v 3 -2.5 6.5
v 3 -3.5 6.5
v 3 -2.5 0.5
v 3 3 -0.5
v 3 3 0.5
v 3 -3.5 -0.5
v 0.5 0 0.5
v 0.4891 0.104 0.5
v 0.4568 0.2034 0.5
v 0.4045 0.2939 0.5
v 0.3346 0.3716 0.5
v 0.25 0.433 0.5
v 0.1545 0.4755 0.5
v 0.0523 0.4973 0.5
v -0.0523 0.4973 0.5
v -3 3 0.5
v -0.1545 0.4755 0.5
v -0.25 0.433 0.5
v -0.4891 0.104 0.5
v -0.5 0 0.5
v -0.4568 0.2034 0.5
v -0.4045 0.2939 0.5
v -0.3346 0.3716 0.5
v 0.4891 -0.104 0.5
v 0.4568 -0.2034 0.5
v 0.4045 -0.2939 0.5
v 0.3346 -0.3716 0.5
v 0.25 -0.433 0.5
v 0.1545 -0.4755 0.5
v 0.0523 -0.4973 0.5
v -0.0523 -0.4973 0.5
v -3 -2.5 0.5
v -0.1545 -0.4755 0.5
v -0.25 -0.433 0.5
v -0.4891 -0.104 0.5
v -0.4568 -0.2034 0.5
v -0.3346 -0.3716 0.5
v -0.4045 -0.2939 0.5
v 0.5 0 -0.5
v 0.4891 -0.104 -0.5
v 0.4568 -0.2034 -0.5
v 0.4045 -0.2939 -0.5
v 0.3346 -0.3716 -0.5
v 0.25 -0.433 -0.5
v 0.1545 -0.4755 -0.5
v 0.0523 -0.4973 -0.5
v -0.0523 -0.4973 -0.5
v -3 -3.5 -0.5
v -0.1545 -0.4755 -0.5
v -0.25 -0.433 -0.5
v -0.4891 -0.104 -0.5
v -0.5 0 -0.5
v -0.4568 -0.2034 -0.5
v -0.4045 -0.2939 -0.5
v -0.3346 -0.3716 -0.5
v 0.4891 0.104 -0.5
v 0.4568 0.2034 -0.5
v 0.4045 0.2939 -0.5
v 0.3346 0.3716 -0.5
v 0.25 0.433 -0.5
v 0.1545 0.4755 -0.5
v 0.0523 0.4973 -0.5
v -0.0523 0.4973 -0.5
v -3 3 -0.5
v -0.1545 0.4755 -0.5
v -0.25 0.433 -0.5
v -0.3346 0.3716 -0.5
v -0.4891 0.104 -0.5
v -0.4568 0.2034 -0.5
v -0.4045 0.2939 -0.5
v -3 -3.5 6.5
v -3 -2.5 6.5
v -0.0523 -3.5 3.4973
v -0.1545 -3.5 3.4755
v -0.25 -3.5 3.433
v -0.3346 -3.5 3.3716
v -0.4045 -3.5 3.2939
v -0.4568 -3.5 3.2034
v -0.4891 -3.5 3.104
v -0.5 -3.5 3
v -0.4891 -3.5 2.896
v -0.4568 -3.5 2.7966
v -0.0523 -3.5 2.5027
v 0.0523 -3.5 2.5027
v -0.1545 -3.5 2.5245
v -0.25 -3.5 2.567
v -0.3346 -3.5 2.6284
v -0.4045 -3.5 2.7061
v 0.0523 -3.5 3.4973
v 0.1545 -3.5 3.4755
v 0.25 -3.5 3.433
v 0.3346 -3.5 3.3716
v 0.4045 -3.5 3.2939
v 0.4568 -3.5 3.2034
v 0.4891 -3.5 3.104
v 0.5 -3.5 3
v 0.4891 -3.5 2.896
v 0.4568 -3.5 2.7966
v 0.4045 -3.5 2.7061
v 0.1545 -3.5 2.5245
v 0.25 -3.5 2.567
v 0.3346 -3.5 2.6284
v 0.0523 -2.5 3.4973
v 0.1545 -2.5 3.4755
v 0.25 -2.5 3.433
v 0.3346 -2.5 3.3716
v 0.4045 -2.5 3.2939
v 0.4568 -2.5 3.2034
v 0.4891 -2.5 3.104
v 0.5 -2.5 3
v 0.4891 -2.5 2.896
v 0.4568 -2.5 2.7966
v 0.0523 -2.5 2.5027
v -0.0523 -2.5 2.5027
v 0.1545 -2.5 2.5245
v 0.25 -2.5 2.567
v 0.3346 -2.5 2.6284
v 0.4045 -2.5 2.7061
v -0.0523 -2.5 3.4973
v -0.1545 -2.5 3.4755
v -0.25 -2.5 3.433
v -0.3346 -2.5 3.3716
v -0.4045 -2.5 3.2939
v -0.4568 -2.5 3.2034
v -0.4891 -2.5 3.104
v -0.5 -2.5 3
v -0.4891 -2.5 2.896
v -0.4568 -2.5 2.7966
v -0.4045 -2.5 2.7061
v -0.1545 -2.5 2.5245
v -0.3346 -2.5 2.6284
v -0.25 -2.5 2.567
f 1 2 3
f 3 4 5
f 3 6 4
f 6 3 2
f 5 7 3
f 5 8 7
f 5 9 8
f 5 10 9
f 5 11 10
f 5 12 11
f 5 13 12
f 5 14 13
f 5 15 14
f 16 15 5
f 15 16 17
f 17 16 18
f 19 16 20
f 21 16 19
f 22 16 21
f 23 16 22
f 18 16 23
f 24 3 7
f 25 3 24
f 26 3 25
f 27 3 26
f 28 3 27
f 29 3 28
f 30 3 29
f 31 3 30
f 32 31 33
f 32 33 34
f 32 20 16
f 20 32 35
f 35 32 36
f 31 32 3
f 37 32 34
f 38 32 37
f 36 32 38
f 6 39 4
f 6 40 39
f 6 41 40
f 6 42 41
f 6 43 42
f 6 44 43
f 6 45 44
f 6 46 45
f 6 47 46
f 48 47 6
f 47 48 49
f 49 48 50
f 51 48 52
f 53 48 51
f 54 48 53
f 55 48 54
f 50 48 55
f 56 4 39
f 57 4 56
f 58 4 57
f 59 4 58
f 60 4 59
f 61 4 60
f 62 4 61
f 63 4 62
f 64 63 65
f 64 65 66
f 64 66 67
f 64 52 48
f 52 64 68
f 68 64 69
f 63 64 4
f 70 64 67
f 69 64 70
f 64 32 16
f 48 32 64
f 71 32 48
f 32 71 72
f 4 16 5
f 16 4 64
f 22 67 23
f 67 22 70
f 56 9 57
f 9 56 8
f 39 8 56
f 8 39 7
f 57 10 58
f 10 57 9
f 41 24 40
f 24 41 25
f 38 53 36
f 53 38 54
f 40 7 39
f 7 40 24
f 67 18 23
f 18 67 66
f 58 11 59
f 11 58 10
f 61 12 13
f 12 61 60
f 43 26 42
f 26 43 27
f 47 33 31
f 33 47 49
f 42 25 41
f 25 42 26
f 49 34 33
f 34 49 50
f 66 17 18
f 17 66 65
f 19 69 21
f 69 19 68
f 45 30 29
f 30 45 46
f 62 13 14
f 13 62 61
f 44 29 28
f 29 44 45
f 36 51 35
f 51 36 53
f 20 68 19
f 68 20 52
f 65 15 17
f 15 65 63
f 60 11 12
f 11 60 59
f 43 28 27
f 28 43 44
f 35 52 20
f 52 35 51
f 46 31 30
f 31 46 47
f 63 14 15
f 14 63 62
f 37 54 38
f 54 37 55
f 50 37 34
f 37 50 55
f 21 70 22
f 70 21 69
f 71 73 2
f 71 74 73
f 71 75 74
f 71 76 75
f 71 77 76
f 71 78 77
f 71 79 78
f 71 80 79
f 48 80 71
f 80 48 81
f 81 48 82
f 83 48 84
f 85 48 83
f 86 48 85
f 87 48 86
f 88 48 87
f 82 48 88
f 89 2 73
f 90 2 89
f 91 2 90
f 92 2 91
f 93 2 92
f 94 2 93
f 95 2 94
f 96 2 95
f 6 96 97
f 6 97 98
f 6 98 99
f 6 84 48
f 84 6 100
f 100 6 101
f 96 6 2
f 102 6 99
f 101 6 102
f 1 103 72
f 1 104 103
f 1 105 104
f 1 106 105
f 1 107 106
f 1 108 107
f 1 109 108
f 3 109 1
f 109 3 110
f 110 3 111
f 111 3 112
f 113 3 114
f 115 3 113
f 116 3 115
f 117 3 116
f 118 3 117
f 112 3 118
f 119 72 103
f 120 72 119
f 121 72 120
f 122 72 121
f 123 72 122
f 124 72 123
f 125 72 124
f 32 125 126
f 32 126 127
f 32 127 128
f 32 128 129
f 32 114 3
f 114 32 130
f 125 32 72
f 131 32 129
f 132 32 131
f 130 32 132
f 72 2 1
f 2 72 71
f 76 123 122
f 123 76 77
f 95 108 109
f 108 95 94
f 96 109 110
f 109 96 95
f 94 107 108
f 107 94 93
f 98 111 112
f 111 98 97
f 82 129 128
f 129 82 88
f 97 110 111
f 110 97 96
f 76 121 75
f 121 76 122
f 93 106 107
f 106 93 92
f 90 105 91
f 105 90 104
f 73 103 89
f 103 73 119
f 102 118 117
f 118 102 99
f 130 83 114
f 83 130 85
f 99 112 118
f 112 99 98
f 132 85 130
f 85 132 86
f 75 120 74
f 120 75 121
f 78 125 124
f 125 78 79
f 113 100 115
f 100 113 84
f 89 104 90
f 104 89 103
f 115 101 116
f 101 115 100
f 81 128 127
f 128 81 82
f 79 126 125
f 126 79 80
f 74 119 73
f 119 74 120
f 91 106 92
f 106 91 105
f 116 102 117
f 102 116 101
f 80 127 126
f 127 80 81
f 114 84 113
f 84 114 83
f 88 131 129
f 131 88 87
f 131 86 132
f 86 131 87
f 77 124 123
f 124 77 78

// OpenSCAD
module plate(x, y, z, r, center=false) {
    difference(){
        cube([x, y, z], center=center);
        if (!center)
            translate([x/2, y/2, -z/2 - .5]) cylinder(h=z+1.5, r=r, $fn = 30);
        else
            translate([0, 0, -z/2 - .5]) cylinder(h=z+1.5, r=r, $fn = 30);
    }
}

module bracket(x, y, z, r, center=false){
    plate(x, y, z, r, center);
    if (!center)
        rotate(a=90, v=[1, 0, 0]) plate(x, y + z, z, r, center);
    else
        translate([0, -y/2, y/2]) rotate(a=90, v=[1, 0, 0]) plate(x, y + z, z, r, center);
}

bracket(6, 6, 1, .5, true);
